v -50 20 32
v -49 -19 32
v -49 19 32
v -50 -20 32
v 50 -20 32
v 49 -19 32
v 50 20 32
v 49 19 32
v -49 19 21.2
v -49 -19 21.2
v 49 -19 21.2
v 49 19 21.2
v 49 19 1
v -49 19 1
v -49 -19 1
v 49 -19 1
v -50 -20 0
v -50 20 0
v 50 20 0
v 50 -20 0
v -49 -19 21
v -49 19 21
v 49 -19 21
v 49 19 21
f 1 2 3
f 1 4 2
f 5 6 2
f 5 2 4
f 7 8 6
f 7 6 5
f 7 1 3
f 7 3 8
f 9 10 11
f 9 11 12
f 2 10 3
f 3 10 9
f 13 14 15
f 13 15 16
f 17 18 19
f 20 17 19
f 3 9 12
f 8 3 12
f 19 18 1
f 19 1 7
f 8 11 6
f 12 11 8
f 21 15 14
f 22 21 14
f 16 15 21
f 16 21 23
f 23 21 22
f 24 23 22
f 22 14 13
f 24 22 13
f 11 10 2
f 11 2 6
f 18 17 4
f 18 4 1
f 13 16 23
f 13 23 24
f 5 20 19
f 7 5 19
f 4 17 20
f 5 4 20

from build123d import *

# Parameters (mm, degrees)
F0_W     = 100
F0_H     = 40
F1_DEPTH = 32
F2_T     = -1
F3_W     = 38
F3_H     = 0.2
F4_DEPTH = 98


with BuildPart() as f1:
    # F0 (on Top) → F1 (new body)
    with BuildSketch(Plane.XY):
        Rectangle(F0_W, F0_H)
    extrude(amount=F1_DEPTH)

    # F2
    f2_openings = [f1.faces().sort_by_distance(p)[0] for p in [
        (0, 0, 32),
    ]]
    offset(amount=F2_T, openings=f2_openings)

    # F3 (on face) → F4 (join, through all)
    with BuildSketch(Plane.YZ.offset(-49)):
        with Locations((0, 21.1)):
            Rectangle(F3_W, F3_H)
    extrude(amount=F4_DEPTH)


solid = f1.part
